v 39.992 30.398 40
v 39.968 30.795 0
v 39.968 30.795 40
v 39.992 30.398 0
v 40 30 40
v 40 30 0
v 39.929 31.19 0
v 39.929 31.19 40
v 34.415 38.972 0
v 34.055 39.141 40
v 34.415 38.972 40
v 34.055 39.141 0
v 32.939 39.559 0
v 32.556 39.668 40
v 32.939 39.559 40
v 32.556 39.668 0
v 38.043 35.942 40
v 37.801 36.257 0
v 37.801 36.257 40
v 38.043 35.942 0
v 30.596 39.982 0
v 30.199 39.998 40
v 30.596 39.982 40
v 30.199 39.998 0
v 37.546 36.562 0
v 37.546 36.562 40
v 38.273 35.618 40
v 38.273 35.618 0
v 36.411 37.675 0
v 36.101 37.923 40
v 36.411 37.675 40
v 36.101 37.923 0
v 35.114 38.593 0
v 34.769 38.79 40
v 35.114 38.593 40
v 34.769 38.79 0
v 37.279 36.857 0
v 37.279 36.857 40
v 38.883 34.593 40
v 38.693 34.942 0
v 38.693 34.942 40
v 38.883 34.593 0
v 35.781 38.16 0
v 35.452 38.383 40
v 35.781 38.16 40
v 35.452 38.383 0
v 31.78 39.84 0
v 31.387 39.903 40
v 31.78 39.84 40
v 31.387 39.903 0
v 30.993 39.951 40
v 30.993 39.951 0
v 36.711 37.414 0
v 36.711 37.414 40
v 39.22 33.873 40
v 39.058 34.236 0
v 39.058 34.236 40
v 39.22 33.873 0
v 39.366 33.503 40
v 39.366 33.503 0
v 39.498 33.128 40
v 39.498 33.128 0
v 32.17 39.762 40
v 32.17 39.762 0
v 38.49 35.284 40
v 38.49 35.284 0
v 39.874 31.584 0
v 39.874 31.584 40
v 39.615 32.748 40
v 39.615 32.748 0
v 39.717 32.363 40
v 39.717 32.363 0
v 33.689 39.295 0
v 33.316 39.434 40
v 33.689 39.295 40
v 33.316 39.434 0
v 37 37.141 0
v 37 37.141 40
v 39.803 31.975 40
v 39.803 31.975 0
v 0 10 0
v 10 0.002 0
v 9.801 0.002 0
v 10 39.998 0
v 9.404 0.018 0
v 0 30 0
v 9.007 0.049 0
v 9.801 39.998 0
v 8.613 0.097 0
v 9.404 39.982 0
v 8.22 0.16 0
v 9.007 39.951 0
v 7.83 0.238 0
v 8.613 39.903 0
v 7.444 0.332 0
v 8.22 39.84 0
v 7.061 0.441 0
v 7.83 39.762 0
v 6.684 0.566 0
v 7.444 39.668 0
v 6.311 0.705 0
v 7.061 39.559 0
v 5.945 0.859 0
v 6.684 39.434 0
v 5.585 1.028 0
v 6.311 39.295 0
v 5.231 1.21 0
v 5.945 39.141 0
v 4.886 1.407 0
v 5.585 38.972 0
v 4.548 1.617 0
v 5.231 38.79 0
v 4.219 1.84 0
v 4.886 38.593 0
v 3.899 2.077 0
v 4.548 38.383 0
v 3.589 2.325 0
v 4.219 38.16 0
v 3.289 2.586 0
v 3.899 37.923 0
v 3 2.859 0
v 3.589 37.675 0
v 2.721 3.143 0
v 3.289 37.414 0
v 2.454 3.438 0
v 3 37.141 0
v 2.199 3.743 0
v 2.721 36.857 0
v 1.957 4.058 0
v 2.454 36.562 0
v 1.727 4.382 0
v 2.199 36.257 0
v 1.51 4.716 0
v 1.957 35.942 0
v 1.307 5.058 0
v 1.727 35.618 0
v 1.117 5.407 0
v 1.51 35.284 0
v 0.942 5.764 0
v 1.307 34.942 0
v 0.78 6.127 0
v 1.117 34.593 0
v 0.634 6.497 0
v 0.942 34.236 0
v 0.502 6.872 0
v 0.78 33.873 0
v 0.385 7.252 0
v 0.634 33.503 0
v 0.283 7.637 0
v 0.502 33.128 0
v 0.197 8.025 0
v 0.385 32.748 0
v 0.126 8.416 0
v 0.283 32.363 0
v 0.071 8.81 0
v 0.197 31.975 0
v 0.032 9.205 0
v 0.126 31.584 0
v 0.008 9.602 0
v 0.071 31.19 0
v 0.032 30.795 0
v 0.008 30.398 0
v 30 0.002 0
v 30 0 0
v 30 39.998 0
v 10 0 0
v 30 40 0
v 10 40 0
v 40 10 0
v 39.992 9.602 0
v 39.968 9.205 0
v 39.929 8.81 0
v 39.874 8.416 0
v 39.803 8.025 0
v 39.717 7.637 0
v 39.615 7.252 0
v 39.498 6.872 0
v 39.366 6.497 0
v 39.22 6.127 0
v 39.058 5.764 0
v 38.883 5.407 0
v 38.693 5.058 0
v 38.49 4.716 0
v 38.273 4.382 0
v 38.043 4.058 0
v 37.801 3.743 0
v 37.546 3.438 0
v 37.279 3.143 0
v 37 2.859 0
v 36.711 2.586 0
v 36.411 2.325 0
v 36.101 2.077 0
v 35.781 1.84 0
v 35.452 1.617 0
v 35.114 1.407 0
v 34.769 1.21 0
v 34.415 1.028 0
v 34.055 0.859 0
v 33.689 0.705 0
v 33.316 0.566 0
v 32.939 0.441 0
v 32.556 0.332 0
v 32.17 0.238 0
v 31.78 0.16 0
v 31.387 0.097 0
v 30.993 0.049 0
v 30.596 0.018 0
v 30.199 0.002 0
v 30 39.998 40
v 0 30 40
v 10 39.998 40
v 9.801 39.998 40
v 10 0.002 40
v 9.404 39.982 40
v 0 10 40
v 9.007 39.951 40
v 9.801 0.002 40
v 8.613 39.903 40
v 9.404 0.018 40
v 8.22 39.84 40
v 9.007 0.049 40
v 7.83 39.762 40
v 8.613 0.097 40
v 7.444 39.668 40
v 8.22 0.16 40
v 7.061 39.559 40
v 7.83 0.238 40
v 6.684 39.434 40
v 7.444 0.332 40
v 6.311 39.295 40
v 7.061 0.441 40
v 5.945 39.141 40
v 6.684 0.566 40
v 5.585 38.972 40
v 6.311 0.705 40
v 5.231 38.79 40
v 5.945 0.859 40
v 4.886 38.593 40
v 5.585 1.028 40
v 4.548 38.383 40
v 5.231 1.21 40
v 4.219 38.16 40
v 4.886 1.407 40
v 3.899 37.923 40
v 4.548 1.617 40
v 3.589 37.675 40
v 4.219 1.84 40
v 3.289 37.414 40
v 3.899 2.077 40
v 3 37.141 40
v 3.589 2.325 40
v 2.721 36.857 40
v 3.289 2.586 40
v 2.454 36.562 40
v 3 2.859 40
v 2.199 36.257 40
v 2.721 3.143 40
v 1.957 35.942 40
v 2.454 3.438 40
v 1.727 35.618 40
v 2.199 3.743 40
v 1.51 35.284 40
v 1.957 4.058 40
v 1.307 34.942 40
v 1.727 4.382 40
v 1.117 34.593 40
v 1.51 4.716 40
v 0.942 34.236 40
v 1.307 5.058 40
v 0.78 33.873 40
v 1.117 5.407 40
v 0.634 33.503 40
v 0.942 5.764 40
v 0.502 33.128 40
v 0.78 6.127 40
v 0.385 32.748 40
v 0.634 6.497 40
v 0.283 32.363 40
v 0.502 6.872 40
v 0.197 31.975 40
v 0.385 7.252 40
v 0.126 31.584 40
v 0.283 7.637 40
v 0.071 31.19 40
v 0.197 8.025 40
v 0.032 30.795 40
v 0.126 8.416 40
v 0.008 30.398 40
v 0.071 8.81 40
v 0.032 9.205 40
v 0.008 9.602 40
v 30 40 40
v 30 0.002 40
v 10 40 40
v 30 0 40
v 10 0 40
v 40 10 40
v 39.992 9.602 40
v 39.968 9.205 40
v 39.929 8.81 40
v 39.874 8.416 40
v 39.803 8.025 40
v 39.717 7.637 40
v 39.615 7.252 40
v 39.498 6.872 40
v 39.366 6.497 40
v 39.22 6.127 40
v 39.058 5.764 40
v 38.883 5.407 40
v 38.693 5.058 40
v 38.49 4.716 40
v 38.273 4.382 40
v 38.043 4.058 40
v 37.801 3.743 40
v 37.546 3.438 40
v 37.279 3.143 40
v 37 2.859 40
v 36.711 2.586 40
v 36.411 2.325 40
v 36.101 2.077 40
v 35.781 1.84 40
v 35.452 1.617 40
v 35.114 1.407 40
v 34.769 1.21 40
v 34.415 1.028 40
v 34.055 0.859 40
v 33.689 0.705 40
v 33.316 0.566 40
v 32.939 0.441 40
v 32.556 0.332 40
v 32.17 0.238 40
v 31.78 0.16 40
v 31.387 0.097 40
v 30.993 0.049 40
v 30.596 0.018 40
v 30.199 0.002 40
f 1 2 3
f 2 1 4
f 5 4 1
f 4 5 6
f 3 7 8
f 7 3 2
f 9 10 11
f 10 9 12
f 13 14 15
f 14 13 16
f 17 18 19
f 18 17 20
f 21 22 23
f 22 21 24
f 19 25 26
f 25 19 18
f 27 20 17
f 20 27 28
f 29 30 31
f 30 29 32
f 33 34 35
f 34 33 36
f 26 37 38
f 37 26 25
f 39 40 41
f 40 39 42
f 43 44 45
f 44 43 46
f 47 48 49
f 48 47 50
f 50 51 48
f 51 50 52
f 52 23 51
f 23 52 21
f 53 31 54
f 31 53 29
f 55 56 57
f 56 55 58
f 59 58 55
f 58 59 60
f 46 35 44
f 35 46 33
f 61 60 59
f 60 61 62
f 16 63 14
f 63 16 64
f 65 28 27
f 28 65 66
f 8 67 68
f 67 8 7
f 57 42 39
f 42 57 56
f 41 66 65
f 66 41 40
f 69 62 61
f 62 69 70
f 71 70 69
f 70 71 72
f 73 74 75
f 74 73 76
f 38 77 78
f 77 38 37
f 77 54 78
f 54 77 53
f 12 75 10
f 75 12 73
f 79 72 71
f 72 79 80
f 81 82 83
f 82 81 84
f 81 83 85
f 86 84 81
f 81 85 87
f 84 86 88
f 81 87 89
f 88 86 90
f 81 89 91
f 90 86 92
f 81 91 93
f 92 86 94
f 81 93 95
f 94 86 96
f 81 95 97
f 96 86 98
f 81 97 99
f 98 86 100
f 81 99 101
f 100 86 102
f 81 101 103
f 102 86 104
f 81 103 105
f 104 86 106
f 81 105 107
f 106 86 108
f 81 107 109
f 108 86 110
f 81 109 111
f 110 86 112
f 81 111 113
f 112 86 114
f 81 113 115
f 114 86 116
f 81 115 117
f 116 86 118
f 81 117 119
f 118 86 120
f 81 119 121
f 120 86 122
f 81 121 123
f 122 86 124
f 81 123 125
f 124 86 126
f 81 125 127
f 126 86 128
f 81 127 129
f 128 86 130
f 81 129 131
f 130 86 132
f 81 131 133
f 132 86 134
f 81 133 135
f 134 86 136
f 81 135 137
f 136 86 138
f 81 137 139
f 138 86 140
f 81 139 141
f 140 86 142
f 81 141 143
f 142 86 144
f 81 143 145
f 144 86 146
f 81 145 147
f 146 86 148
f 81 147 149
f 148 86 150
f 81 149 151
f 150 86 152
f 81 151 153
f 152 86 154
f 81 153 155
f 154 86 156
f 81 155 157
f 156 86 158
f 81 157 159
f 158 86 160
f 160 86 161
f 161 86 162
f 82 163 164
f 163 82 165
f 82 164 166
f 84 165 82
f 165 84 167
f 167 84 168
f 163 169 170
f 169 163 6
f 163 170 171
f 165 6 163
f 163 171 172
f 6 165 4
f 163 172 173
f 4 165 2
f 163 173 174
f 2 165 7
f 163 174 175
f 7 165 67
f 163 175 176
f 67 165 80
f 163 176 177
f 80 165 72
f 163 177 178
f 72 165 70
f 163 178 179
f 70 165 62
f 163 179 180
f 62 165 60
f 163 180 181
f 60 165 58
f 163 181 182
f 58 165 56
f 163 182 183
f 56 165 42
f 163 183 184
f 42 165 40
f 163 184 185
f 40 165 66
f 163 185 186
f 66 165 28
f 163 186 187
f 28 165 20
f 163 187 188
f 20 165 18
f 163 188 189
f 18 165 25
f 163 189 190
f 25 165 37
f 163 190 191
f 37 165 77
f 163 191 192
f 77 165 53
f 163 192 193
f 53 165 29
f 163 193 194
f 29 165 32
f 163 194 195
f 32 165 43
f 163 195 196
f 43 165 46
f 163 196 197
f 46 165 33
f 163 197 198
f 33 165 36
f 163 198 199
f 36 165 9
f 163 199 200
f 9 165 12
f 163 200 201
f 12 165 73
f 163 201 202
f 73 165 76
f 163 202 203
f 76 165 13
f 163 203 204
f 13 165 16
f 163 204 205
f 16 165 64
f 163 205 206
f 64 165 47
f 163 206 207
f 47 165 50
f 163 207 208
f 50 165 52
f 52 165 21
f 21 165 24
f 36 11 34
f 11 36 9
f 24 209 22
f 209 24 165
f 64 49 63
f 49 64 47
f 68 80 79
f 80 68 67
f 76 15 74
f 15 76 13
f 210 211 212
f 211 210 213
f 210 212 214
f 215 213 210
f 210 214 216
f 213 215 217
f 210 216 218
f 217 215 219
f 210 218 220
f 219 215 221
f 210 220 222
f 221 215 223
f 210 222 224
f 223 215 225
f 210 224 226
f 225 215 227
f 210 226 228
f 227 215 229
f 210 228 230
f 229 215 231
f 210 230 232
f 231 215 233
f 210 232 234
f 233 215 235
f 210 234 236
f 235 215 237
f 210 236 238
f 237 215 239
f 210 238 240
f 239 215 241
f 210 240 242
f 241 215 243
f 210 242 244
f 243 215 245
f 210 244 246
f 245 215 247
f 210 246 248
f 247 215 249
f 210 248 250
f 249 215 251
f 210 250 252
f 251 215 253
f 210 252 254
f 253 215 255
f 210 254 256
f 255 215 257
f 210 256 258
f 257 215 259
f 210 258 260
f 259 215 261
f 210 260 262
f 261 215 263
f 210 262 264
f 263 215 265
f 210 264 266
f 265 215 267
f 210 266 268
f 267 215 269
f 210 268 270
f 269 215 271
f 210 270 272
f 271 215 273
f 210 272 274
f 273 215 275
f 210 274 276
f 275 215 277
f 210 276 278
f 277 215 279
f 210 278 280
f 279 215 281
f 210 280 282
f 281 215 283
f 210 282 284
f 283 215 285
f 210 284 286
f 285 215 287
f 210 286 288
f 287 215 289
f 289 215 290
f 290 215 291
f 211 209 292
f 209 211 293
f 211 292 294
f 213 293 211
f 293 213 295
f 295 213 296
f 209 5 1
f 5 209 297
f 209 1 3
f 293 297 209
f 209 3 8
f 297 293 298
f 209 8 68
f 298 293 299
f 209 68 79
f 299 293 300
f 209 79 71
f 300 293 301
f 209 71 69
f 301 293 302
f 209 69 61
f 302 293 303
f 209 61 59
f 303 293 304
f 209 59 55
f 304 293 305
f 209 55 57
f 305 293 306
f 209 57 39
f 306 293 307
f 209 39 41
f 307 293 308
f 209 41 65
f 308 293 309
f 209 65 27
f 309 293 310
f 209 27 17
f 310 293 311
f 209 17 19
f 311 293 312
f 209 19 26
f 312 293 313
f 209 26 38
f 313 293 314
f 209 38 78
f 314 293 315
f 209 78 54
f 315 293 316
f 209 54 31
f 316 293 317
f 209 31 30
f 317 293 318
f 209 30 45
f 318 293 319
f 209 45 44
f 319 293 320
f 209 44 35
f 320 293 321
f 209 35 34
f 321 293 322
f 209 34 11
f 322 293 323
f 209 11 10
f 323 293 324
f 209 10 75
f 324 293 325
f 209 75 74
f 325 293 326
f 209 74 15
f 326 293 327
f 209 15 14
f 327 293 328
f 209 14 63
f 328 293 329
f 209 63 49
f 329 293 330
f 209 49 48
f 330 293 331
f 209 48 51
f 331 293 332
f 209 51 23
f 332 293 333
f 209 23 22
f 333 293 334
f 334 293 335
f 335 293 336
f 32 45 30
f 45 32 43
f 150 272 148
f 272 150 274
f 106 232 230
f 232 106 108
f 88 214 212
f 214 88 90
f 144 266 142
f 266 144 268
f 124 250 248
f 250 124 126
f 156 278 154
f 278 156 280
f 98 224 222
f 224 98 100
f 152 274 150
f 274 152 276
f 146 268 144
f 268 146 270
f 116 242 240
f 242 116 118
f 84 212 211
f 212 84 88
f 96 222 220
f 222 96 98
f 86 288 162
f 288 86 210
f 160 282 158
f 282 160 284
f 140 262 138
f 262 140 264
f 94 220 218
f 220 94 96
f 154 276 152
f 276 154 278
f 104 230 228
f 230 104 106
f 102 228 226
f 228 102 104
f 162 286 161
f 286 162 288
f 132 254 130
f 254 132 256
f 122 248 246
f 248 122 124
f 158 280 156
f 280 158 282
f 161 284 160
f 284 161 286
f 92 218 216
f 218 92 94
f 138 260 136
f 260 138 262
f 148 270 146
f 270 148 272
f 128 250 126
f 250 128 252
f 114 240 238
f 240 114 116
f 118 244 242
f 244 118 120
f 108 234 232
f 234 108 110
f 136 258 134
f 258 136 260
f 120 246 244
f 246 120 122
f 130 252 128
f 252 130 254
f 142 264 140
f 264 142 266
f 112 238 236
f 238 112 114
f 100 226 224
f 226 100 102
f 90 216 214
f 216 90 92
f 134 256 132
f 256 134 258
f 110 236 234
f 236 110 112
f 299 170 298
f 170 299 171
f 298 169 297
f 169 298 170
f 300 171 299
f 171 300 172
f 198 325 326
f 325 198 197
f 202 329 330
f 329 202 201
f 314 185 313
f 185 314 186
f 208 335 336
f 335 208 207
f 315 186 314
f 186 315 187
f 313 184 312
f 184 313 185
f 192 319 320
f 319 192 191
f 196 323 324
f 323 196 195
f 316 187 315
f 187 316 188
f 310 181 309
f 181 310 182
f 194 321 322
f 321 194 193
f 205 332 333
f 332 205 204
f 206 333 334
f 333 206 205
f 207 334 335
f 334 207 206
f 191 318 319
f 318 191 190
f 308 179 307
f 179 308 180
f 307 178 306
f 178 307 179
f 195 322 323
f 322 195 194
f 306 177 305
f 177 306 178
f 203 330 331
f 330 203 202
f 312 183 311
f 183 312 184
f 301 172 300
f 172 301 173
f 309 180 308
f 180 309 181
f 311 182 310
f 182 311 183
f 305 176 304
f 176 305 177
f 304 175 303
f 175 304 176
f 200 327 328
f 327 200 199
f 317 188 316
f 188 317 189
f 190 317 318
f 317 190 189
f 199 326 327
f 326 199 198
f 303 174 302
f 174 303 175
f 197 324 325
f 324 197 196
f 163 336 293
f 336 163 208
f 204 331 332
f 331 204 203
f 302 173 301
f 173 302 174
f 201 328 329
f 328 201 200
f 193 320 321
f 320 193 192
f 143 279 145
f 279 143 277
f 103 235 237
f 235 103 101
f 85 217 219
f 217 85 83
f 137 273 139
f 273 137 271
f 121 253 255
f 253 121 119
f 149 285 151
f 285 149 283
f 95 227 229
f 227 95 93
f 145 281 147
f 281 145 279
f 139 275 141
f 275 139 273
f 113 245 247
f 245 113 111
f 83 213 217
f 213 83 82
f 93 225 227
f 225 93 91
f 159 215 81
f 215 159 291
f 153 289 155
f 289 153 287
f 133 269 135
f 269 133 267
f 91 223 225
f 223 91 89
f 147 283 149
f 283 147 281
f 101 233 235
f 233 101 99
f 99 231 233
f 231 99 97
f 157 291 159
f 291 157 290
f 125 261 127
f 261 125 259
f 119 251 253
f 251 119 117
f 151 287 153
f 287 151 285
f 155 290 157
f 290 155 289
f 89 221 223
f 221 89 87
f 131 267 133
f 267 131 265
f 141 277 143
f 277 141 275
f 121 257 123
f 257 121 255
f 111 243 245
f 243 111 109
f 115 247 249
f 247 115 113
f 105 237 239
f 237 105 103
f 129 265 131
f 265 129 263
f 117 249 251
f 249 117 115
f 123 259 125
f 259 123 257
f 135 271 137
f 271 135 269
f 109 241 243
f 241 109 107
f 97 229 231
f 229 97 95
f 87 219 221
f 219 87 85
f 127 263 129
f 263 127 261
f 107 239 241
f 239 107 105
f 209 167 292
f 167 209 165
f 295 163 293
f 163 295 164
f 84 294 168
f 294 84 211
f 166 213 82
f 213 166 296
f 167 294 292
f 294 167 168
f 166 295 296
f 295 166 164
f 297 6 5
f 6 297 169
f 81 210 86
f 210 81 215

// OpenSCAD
// file: ../lib/lib.scad
function sel(v, indices) = [ for (i = indices) v[i] ];
function eps() = 0.01;

module cmirror(v = [1, 0, 0])
{
	children();
	mirror(v)
		children();
}

module rcube2d
(
	s = [10, 10, 10],
	r = 2,
	singleSided = false,
)
{
	width = s[0];
	depth = s[1];
	height = s[2];

	union()
	{
		cmirror([0, 1, 0])
		cmirror()
		translate([width / 2 - r, depth / 2 - r, 0])
		cylinder(h = height, r = r);
		translate([r - width / 2, -depth / 2, 0])
		cube([width - r*2, depth, height]);
		translate([-width / 2, r - depth / 2, 0])
		cube([width, depth - r*2, height]);
	}

	if (singleSided)
	{
		translate([-width / 2, -depth / 2, 0])
		cube([width, r*2, height]);
	}
}

module rcube3d
(
	s = [10, 10, 10],
	r = 2,
	singleSided = false,
)
{
	width = s[0];
	depth = s[1];
	height = s[2];

	w2 = width - r*2;
	d2 = depth - r*2;
	h2 = height - r*2;

	translate([0, 0, r])
	rcube2d([width, depth, h2], r);

	translate([0, 0, height / 2])
	cmirror([0, 0, 1])
	cmirror([0, 1, 0])
	translate([0, d2 / 2, height / 2 - r])
	translate([-w2 / 2, 0, 0])
	rotate([0, 90, 0])
	cylinder(h = w2, r = r);

	translate([0, 0, height / 2])
	cmirror([0, 0, 1])
	cmirror()
	translate([w2 / 2, 0, h2 / 2])
	translate([0, d2 / 2, 0])
	rotate([90, 0, 0])
	cylinder(h = d2, r = r);

	translate([-w2 / 2, -d2 / 2, 0])
	cube([w2, d2, height]);

	translate([0, 0, height / 2])
	cmirror([0, 0, 1])
	cmirror([0, 1, 0])
	cmirror()
	translate([w2 / 2, d2 / 2, h2 / 2])
	sphere(r);

	if (singleSided)
	{
		translate([0, -depth / 2, height / 2])
		rotate([-90, 0, 0])
		rcube2d([width, height, r*2], r);
	}
}

module rcube
(
	s = [10, 10, 10],
	r = 2,
	flat = true,
	singleSided = false,
	aX = 0,
	aY = 0,
	aZ = 0,
)
{
	width = s[0];
	depth = s[1];
	height = s[2];

	rw = r > width ? width : r;

	translate
	([
		(1 - aX) * width / 2,
		(1 - aY) * depth / 2,
		-aZ * height / 2
	])
	if (flat)
		rcube2d(s, rw, singleSided);
	else
	{
		rh = rw > height ? height : rw;
		rcube3d(s, rh, singleSided);
	}
}

module chamfer
(
	s = [10, 20, 6],
	round = true,
	aX = 0,
	aY = 0,
	aZ = 0,
	rotation = 0,
)
{
	width = s[0];
	depth = s[1];
	height = s[2];

	r = width < height ? width : height;

	rotate([0, rotation * 90, 0])
	translate
	([
		-aX * r / 2,
		-aY * depth / 2,
		-aZ * r / 2
	])
	if (round)
	{
		difference()
		{
			cube(s);

			translate([r, -depth / 2, 0])
			union()
			{
				translate([0, 0, r])
				rotate([-90, 0, 0])
				cylinder(d = 2 * r, h = 2 * depth);

				translate([0, 0, -r / 2])
				cube([2 * width, 2 * depth, 2 * r]);

				translate([-1.5 * r, 0, r])
				cube([2 * r, 2 * depth, 2 * height]);
			}
		}
	}
	else
	{
		difference()
		{
			cube(s);

			translate([0, 1.5 * depth, 0])
			rotate([90, 0, 0])
			linear_extrude(2 * depth)
			polygon
			([
				[ 2 * width, -1 * height],
				[ 2 * width,  2 * height],
				[-1 * width,  2 * height],
			]);
		}
	}
}
// main file
$fa = 1.0;
$fs = 0.4;

use <../lib/lib.scad>

rcube
(
	[40, 40, 40],
	aX = 0,
	aY = 0,
	aZ = 0,
	r = 10,
	flat = true,
	singleSided = false
);
